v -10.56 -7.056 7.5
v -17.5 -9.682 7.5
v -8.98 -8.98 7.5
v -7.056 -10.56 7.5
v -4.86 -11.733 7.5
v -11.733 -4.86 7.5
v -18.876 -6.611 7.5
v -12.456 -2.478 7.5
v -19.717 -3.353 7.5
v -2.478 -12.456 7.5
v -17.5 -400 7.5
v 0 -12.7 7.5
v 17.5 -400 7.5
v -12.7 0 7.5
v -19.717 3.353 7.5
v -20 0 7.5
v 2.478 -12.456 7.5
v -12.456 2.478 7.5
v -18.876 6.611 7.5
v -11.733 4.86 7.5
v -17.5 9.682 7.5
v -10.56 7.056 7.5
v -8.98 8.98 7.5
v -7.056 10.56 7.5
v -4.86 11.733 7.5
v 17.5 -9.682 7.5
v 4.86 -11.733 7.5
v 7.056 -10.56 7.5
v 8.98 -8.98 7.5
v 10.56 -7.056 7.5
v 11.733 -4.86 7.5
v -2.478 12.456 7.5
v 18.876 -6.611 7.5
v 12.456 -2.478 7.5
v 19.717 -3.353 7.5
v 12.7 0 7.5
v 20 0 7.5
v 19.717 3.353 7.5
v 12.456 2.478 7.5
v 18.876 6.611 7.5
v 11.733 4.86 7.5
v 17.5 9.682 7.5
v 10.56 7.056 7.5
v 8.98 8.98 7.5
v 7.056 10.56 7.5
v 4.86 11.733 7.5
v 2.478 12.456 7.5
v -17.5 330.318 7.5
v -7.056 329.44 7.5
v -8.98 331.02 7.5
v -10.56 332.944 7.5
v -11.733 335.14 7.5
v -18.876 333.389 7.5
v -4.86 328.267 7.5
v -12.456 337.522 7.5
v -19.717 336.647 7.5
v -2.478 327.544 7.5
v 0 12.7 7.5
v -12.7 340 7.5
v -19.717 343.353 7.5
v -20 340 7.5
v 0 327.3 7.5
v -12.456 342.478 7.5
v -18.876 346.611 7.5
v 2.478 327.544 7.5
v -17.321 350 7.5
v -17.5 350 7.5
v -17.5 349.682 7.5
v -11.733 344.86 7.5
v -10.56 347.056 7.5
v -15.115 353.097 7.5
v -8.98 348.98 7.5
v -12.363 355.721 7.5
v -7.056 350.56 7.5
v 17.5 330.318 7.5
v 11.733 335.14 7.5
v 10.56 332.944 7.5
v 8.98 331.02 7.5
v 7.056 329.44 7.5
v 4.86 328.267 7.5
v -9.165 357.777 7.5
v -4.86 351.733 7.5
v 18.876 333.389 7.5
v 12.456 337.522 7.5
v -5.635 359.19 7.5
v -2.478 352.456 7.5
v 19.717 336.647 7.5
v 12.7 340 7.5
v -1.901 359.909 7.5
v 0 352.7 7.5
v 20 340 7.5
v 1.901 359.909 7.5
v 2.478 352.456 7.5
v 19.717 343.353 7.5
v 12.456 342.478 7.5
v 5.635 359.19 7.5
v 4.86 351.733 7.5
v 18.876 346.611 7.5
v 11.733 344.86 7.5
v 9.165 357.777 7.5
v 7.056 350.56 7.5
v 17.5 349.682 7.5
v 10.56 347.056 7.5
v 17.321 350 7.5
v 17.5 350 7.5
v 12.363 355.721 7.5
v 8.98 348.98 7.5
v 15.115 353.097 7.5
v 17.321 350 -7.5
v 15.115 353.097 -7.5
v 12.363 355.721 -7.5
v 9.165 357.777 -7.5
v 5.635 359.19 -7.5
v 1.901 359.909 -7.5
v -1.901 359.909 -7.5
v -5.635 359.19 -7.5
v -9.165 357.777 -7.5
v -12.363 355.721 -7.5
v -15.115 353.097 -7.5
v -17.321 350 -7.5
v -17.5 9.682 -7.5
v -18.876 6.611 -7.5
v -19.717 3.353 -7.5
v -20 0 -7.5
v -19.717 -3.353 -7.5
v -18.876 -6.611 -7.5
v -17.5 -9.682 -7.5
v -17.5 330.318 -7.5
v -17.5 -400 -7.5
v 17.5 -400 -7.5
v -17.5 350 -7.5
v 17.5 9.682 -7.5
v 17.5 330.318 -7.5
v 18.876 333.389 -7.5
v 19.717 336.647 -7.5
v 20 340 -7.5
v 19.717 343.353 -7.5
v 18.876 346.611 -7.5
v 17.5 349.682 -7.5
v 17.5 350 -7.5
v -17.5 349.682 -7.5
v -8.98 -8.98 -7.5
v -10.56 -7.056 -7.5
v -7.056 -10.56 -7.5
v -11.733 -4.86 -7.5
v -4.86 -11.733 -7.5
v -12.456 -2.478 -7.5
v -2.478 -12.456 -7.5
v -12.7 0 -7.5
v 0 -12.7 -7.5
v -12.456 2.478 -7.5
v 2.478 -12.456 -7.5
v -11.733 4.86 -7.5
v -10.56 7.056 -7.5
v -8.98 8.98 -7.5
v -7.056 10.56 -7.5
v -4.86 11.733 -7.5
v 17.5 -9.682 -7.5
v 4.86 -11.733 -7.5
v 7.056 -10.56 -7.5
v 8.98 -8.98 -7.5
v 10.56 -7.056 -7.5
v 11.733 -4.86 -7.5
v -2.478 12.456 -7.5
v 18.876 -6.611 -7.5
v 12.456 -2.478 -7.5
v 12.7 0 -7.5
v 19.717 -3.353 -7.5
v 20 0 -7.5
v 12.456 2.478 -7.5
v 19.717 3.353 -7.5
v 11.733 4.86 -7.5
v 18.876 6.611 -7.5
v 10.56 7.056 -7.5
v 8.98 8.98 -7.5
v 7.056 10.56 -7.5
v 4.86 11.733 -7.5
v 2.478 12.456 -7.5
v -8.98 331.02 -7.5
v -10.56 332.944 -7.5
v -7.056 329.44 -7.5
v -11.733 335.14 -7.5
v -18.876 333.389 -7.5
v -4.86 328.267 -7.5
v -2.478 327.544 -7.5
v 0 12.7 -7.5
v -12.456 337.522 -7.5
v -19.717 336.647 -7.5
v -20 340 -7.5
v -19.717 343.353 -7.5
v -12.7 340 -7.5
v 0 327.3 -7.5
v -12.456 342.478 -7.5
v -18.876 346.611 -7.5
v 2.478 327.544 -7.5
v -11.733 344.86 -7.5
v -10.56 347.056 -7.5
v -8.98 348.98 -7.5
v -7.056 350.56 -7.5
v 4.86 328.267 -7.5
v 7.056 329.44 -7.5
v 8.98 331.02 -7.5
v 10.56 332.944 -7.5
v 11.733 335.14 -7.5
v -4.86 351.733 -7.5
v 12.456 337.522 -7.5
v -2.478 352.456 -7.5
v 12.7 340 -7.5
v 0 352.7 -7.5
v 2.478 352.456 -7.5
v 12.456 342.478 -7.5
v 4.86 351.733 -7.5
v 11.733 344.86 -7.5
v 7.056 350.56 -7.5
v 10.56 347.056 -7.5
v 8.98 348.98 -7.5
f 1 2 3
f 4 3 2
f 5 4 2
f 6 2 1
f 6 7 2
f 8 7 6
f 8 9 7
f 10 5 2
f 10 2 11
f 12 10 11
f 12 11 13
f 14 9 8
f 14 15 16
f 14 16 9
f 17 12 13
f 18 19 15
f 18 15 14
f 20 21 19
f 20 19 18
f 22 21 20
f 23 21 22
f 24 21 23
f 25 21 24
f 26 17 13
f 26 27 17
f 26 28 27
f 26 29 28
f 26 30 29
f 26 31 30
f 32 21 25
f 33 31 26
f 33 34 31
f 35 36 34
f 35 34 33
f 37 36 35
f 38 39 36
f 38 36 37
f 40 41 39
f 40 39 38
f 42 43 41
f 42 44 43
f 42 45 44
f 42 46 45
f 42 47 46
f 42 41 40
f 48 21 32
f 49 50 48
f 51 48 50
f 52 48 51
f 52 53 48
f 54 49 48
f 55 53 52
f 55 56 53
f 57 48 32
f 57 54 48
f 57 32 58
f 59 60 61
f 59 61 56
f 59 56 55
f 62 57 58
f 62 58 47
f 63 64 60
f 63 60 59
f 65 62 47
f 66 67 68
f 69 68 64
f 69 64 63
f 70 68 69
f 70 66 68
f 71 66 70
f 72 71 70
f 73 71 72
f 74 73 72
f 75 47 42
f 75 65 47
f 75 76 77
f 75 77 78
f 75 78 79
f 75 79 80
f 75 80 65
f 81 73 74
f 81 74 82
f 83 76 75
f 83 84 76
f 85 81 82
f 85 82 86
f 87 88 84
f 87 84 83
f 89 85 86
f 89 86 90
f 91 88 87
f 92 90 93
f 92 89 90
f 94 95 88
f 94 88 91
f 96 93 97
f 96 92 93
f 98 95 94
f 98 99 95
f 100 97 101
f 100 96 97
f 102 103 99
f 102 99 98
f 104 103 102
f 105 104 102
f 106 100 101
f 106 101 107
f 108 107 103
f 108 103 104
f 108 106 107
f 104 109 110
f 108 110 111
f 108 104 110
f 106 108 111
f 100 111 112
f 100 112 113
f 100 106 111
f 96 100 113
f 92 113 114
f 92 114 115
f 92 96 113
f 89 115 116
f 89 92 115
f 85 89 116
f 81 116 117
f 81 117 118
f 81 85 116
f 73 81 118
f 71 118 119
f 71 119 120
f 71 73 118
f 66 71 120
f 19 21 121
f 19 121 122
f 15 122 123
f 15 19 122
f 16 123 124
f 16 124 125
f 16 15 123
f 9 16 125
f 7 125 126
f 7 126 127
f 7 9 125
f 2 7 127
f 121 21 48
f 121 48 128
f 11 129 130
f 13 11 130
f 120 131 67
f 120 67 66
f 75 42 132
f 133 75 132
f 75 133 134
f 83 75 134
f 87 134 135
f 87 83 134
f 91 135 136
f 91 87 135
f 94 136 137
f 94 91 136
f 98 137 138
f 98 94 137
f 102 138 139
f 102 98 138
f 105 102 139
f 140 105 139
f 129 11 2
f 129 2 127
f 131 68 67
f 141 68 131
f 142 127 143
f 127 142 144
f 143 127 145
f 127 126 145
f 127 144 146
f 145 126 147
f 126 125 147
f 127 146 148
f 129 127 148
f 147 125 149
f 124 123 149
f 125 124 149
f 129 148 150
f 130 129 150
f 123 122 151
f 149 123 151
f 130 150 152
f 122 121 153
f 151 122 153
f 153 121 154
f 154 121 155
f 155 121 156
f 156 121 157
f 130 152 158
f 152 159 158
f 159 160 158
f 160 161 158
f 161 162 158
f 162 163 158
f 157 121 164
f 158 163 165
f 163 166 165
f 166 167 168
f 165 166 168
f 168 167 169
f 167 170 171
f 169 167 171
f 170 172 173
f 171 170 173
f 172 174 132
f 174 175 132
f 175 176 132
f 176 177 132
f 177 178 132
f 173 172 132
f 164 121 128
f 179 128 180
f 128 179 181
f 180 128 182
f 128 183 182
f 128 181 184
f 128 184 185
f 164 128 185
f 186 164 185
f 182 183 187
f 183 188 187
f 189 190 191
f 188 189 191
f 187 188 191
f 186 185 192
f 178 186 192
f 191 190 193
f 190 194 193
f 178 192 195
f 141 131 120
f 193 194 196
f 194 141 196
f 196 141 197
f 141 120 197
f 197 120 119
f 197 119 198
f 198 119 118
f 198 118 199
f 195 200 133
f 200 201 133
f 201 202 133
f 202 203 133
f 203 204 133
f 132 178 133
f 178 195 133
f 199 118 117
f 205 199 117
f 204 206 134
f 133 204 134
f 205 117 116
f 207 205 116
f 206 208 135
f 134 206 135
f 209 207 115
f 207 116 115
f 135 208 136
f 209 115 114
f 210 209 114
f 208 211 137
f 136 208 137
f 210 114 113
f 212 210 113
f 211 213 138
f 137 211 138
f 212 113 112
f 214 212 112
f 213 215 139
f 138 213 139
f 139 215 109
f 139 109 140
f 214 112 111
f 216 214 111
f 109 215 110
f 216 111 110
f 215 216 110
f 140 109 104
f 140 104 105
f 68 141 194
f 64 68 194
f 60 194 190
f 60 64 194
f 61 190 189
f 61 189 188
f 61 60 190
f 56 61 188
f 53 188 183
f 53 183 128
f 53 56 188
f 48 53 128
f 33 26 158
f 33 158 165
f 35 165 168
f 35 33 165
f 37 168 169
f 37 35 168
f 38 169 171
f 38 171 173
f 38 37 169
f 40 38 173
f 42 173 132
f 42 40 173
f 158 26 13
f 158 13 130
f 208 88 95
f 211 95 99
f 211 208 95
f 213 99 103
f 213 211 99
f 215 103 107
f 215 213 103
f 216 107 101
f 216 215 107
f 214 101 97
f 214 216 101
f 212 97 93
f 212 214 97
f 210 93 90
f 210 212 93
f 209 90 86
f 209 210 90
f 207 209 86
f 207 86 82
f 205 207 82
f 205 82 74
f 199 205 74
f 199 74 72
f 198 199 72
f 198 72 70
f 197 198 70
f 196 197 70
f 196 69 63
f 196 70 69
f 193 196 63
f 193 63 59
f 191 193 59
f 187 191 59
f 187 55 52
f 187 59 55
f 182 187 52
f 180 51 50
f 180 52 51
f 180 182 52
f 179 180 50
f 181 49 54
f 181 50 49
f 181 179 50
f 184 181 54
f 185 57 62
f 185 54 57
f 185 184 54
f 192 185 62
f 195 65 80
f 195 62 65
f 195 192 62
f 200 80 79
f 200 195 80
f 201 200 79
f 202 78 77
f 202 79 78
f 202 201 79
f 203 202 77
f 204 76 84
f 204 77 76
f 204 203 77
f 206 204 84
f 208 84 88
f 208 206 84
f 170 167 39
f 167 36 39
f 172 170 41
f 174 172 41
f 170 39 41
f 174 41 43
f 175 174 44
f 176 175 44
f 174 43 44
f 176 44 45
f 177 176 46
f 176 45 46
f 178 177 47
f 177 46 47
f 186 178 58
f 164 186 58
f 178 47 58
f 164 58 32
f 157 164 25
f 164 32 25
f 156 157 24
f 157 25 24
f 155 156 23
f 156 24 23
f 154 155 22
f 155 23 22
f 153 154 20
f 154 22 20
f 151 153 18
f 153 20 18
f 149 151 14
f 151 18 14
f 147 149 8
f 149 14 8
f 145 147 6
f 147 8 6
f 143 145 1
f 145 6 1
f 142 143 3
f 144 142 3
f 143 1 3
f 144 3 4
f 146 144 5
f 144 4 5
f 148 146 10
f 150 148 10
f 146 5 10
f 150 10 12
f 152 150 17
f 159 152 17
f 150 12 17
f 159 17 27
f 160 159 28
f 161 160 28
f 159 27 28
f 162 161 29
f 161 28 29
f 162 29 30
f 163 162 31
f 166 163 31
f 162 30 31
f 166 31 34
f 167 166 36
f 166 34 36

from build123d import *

# Parameters (mm, degrees)
SKETCH2_R           = 20
SKETCH2_R_2         = 12.7
BOSS_EXTRUDE1_DEPTH = 7.5
SKETCH4_W           = 35
SKETCH4_H           = 15
BOSS_EXTRUDE2_DEPTH = 400
SKETCH4_2_W         = 35
SKETCH4_2_H         = 15
BOSS_EXTRUDE3_DEPTH = 350
SKETCH5_R           = 12.7
CUT_EXTRUDE1_DEPTH  = 8.5
LPATTERN1_COUNT     = 2
LPATTERN1_PITCH     = 340


with BuildPart() as part:
    # Sketch2 → Boss-Extrude1 (new body, symmetric)
    with BuildSketch(Plane.XY):
        Circle(SKETCH2_R)
        Circle(SKETCH2_R_2, mode=Mode.SUBTRACT)
    boss_extrude1 = extrude(amount=BOSS_EXTRUDE1_DEPTH, both=True)

    # Sketch4 → Boss-Extrude2 (add)
    with BuildSketch(Plane(origin=(0, 0, 0), x_dir=(1, 0, 0), z_dir=(0, 1, 0))):
        Rectangle(SKETCH4_W, SKETCH4_H)
    extrude(amount=-BOSS_EXTRUDE2_DEPTH)

    # Sketch4<2> → Boss-Extrude3 (add)
    with BuildSketch(Plane(origin=(0, 0, 0), x_dir=(1, 0, 0), z_dir=(0, 1, 0))):
        Rectangle(SKETCH4_2_W, SKETCH4_2_H)
    extrude(amount=BOSS_EXTRUDE3_DEPTH)

    # Sketch5 → Cut-Extrude1 (cut, symmetric)
    with BuildSketch(Plane.XY):
        Circle(SKETCH5_R)
    cut_extrude1 = extrude(amount=CUT_EXTRUDE1_DEPTH, both=True, mode=Mode.SUBTRACT)

    # LPattern1: Boss-Extrude1, Cut-Extrude1 ×2
    with Locations(*[(0, i * LPATTERN1_PITCH, 0) for i in range(1, LPATTERN1_COUNT)]):
        add(boss_extrude1)
        add(cut_extrude1, mode=Mode.SUBTRACT)


solid = part.part
